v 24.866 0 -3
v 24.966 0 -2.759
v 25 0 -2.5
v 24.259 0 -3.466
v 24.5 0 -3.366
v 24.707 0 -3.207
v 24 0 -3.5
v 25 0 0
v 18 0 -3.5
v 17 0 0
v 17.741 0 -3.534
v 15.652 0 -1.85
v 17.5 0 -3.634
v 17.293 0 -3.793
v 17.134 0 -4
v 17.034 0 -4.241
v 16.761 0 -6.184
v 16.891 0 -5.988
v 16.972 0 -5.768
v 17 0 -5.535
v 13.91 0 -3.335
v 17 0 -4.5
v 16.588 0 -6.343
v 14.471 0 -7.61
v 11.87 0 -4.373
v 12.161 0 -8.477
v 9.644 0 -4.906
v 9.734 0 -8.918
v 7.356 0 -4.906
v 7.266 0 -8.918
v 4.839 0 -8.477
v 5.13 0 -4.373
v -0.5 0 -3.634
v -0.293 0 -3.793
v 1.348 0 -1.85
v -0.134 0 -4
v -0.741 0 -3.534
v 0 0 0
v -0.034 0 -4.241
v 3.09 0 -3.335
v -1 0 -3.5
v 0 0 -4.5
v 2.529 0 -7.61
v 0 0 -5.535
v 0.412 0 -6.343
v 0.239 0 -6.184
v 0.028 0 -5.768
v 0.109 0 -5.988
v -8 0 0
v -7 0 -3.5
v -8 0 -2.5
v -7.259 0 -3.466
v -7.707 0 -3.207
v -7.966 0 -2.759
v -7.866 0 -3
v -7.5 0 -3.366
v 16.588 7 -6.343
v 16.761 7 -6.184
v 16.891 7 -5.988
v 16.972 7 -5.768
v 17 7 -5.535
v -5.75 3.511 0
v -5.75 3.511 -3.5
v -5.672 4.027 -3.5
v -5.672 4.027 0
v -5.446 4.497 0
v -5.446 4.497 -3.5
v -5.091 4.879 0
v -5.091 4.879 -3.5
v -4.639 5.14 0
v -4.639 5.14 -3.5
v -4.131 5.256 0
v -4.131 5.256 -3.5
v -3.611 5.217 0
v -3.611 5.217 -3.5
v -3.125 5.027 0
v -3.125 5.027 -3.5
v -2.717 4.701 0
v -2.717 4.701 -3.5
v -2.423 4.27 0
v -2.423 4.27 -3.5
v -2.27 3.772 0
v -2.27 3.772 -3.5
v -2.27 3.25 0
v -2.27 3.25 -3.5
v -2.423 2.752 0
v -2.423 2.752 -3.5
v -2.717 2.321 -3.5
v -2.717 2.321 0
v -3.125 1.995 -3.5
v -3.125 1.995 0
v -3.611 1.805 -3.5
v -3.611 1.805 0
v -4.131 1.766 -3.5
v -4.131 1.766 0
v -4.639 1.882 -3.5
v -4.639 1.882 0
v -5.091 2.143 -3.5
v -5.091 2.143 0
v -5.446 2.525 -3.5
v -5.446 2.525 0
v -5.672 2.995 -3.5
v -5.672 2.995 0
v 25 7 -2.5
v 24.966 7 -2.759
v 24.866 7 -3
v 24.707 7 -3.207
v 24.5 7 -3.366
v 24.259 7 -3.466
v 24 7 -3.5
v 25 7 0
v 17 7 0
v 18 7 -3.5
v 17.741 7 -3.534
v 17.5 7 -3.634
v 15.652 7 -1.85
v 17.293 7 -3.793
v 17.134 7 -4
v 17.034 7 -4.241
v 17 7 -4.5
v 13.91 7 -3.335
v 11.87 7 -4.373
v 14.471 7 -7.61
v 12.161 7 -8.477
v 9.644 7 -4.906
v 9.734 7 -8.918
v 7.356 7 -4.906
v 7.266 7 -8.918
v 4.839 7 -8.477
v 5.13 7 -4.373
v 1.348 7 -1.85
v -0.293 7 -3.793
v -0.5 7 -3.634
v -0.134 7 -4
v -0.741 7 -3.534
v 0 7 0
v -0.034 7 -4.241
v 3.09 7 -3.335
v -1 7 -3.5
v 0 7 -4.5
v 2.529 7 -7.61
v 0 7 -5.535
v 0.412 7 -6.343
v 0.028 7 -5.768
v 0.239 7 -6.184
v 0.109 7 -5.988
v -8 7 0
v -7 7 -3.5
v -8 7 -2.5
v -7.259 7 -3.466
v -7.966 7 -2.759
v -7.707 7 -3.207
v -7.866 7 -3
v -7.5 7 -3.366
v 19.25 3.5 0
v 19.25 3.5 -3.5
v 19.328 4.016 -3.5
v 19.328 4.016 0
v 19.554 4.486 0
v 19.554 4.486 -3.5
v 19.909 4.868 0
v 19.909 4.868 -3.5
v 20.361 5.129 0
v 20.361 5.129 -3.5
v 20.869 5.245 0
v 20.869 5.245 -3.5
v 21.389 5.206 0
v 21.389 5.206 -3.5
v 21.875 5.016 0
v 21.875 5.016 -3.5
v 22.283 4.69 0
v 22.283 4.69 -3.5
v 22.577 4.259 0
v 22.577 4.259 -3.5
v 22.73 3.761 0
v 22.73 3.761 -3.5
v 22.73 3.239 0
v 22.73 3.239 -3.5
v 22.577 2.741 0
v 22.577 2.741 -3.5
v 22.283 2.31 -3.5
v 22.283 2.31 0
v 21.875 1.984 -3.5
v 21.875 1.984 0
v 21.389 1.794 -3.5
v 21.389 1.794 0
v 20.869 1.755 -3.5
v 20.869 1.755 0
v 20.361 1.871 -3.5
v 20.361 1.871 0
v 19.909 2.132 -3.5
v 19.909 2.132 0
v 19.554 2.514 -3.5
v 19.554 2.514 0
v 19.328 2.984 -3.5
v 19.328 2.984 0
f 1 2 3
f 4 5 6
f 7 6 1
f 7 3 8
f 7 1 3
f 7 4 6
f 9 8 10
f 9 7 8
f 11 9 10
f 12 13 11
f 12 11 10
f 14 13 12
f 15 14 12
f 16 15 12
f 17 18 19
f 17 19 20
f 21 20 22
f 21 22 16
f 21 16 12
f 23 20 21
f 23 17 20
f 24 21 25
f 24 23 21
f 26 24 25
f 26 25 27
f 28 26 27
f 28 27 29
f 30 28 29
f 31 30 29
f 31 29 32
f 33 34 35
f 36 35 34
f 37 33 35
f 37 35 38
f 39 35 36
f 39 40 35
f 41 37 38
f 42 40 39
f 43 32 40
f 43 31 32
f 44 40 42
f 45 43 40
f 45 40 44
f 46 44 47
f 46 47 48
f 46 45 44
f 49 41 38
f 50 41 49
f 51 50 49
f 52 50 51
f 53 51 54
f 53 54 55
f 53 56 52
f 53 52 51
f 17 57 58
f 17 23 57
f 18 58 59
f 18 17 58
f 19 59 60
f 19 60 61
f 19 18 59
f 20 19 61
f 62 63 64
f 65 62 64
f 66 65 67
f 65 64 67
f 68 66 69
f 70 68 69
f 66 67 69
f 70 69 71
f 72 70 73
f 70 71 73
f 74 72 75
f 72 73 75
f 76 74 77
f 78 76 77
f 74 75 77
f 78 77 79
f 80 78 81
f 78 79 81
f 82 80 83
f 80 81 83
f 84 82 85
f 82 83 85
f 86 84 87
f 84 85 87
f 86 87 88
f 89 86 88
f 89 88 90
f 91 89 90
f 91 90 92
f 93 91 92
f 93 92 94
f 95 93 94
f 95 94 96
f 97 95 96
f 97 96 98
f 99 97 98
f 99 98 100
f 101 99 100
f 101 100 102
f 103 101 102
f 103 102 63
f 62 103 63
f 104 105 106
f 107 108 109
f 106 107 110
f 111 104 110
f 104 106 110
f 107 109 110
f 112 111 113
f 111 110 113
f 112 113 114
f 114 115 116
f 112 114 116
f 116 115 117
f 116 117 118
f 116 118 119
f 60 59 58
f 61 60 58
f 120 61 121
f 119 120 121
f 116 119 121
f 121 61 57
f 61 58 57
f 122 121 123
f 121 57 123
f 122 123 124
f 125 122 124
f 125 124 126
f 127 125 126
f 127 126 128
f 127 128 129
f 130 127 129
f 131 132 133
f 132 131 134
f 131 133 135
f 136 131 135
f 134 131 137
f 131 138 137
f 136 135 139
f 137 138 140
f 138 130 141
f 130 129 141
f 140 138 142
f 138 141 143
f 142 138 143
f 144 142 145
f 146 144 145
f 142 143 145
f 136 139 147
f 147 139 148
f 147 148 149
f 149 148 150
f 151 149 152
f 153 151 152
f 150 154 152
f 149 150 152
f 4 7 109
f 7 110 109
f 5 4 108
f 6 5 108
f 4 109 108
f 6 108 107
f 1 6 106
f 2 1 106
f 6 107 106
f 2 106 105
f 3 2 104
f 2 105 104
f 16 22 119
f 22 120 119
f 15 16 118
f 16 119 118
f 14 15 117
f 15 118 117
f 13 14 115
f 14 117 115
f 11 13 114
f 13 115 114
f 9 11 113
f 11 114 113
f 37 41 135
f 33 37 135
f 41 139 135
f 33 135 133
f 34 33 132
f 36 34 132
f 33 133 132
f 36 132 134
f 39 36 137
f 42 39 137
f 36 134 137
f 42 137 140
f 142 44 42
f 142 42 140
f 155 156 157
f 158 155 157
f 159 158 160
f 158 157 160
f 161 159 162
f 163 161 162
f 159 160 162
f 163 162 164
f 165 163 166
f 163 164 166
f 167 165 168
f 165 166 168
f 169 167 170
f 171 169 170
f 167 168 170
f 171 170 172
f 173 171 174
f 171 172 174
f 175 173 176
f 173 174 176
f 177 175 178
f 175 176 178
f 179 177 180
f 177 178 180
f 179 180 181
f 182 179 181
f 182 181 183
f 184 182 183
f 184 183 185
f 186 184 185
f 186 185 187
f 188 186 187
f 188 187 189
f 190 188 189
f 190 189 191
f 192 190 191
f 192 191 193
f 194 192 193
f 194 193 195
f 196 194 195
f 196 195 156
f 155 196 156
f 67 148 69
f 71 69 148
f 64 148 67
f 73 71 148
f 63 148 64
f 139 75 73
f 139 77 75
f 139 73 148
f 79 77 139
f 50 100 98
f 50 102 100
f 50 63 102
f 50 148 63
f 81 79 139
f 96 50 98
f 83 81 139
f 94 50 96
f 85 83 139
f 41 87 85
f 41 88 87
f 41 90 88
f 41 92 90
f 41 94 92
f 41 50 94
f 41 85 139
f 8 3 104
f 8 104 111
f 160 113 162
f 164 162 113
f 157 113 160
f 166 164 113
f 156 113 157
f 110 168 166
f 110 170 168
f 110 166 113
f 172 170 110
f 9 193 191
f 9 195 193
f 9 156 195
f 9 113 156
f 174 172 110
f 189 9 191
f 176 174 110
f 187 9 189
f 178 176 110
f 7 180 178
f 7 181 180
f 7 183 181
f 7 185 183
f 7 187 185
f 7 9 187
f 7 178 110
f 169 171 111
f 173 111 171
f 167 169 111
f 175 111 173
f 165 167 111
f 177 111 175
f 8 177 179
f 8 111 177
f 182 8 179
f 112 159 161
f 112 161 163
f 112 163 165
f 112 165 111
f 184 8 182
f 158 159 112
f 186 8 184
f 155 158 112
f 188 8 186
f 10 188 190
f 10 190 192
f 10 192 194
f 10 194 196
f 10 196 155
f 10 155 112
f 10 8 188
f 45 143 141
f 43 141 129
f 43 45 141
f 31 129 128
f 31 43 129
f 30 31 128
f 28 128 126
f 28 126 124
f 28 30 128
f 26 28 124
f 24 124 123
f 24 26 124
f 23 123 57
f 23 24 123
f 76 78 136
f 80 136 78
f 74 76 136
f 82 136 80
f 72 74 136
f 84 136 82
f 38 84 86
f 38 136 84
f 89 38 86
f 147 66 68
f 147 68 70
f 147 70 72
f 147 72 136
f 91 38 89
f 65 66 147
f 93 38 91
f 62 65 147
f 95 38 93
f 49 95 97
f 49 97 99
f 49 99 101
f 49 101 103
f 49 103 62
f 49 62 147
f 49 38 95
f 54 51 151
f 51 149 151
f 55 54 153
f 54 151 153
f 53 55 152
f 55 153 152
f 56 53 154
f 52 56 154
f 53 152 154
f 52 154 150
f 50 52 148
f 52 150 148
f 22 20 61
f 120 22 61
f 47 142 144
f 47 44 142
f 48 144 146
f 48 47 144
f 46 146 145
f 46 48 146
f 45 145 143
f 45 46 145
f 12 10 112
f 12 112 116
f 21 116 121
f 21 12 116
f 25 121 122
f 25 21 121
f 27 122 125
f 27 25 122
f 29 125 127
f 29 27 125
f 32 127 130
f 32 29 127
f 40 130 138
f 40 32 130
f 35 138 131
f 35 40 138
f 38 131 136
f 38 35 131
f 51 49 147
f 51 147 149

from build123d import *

# Parameters (mm, degrees)
BOSS_EXTRUDE1_DEPTH = 7
SKETCH4_W           = 8
SKETCH4_H           = 7
CUT_EXTRUDE5_DEPTH  = 5.473756706
CUT_EXTRUDE6_REACH  = 28.532
SKETCH7_R           = 1.75
FILLET3_R           = 1


with BuildPart() as part:
    # Sketch1 → Boss-Extrude1 (new body)
    with BuildSketch(Plane(origin=(0, 0, 0), x_dir=(1, 0, 0), z_dir=(0, 1, 0))):
        with BuildLine():
            Line((0, 0), (-8, 0))
            Line((-8, 0), (-8, 3.5))
            Line((-8, 3.5), (-2.480268528, 3.5))
            ThreePointArc((-2.480268528, 3.5), (8.5, 8.973756706), (19.480268528, 3.5))
            Line((19.480268528, 3.5), (25, 3.5))
            Line((25, 3.5), (25, 0))
            Line((25, 0), (17, 0))
            ThreePointArc((17, 0), (8.5, 4.973756706), (0, 0))
        make_face()
    extrude(amount=BOSS_EXTRUDE1_DEPTH)

    # Sketch4 → Cut-Extrude5 (cut)
    with BuildSketch(Plane(origin=(0, 0, -8.973756706), x_dir=(-1, 0, 0), z_dir=(0, 0, -1))):
        with Locations((-21, 3.5)):
            Rectangle(SKETCH4_W, SKETCH4_H)
        with Locations((4, 3.5)):
            Rectangle(SKETCH4_W, SKETCH4_H)
    extrude(amount=-CUT_EXTRUDE5_DEPTH, mode=Mode.SUBTRACT)

    # Sketch7 → Cut-Extrude6 (cut, up to next)
    with BuildSketch(Plane(origin=(0, 0, -3.5), x_dir=(-1, 0, 0), z_dir=(0, 0, -1)), mode=Mode.PRIVATE) as cut_extrude6_sk1:
        with Locations((-20.999991214, 3.5)):
            Circle(SKETCH7_R)
    cut_extrude6_tool1 = extrude(cut_extrude6_sk1.sketch, amount=-CUT_EXTRUDE6_REACH, mode=Mode.PRIVATE) & part.part
    # Sketch7 → Cut-Extrude6 (cut, up to next)
    with BuildSketch(Plane(origin=(0, 0, -3.5), x_dir=(-1, 0, 0), z_dir=(0, 0, -1)), mode=Mode.PRIVATE) as cut_extrude6_sk2:
        with Locations((4.000006362, 3.511008166)):
            Circle(SKETCH7_R)
    cut_extrude6_tool2 = extrude(cut_extrude6_sk2.sketch, amount=-CUT_EXTRUDE6_REACH, mode=Mode.PRIVATE) & part.part
    add(cut_extrude6_tool1.solids().sort_by_distance((20.999991, 3.5, -3.5))[0], mode=Mode.SUBTRACT)
    add(cut_extrude6_tool2.solids().sort_by_distance((-4.000006, 3.511008, -3.5))[0], mode=Mode.SUBTRACT)

    # Fillet3
    fillet3_edges = [part.edges().sort_by_distance(p)[0] for p in [
        (-8, 3.5, -3.5),
        (25, 3.5, -3.5),
        (17, 3.5, -6.031739867),
        (17, 3.5, -3.5),
        (0, 3.5, -6.031739867),
        (0, 3.5, -3.5),
    ]]
    fillet(fillet3_edges, radius=FILLET3_R)


solid = part.part
